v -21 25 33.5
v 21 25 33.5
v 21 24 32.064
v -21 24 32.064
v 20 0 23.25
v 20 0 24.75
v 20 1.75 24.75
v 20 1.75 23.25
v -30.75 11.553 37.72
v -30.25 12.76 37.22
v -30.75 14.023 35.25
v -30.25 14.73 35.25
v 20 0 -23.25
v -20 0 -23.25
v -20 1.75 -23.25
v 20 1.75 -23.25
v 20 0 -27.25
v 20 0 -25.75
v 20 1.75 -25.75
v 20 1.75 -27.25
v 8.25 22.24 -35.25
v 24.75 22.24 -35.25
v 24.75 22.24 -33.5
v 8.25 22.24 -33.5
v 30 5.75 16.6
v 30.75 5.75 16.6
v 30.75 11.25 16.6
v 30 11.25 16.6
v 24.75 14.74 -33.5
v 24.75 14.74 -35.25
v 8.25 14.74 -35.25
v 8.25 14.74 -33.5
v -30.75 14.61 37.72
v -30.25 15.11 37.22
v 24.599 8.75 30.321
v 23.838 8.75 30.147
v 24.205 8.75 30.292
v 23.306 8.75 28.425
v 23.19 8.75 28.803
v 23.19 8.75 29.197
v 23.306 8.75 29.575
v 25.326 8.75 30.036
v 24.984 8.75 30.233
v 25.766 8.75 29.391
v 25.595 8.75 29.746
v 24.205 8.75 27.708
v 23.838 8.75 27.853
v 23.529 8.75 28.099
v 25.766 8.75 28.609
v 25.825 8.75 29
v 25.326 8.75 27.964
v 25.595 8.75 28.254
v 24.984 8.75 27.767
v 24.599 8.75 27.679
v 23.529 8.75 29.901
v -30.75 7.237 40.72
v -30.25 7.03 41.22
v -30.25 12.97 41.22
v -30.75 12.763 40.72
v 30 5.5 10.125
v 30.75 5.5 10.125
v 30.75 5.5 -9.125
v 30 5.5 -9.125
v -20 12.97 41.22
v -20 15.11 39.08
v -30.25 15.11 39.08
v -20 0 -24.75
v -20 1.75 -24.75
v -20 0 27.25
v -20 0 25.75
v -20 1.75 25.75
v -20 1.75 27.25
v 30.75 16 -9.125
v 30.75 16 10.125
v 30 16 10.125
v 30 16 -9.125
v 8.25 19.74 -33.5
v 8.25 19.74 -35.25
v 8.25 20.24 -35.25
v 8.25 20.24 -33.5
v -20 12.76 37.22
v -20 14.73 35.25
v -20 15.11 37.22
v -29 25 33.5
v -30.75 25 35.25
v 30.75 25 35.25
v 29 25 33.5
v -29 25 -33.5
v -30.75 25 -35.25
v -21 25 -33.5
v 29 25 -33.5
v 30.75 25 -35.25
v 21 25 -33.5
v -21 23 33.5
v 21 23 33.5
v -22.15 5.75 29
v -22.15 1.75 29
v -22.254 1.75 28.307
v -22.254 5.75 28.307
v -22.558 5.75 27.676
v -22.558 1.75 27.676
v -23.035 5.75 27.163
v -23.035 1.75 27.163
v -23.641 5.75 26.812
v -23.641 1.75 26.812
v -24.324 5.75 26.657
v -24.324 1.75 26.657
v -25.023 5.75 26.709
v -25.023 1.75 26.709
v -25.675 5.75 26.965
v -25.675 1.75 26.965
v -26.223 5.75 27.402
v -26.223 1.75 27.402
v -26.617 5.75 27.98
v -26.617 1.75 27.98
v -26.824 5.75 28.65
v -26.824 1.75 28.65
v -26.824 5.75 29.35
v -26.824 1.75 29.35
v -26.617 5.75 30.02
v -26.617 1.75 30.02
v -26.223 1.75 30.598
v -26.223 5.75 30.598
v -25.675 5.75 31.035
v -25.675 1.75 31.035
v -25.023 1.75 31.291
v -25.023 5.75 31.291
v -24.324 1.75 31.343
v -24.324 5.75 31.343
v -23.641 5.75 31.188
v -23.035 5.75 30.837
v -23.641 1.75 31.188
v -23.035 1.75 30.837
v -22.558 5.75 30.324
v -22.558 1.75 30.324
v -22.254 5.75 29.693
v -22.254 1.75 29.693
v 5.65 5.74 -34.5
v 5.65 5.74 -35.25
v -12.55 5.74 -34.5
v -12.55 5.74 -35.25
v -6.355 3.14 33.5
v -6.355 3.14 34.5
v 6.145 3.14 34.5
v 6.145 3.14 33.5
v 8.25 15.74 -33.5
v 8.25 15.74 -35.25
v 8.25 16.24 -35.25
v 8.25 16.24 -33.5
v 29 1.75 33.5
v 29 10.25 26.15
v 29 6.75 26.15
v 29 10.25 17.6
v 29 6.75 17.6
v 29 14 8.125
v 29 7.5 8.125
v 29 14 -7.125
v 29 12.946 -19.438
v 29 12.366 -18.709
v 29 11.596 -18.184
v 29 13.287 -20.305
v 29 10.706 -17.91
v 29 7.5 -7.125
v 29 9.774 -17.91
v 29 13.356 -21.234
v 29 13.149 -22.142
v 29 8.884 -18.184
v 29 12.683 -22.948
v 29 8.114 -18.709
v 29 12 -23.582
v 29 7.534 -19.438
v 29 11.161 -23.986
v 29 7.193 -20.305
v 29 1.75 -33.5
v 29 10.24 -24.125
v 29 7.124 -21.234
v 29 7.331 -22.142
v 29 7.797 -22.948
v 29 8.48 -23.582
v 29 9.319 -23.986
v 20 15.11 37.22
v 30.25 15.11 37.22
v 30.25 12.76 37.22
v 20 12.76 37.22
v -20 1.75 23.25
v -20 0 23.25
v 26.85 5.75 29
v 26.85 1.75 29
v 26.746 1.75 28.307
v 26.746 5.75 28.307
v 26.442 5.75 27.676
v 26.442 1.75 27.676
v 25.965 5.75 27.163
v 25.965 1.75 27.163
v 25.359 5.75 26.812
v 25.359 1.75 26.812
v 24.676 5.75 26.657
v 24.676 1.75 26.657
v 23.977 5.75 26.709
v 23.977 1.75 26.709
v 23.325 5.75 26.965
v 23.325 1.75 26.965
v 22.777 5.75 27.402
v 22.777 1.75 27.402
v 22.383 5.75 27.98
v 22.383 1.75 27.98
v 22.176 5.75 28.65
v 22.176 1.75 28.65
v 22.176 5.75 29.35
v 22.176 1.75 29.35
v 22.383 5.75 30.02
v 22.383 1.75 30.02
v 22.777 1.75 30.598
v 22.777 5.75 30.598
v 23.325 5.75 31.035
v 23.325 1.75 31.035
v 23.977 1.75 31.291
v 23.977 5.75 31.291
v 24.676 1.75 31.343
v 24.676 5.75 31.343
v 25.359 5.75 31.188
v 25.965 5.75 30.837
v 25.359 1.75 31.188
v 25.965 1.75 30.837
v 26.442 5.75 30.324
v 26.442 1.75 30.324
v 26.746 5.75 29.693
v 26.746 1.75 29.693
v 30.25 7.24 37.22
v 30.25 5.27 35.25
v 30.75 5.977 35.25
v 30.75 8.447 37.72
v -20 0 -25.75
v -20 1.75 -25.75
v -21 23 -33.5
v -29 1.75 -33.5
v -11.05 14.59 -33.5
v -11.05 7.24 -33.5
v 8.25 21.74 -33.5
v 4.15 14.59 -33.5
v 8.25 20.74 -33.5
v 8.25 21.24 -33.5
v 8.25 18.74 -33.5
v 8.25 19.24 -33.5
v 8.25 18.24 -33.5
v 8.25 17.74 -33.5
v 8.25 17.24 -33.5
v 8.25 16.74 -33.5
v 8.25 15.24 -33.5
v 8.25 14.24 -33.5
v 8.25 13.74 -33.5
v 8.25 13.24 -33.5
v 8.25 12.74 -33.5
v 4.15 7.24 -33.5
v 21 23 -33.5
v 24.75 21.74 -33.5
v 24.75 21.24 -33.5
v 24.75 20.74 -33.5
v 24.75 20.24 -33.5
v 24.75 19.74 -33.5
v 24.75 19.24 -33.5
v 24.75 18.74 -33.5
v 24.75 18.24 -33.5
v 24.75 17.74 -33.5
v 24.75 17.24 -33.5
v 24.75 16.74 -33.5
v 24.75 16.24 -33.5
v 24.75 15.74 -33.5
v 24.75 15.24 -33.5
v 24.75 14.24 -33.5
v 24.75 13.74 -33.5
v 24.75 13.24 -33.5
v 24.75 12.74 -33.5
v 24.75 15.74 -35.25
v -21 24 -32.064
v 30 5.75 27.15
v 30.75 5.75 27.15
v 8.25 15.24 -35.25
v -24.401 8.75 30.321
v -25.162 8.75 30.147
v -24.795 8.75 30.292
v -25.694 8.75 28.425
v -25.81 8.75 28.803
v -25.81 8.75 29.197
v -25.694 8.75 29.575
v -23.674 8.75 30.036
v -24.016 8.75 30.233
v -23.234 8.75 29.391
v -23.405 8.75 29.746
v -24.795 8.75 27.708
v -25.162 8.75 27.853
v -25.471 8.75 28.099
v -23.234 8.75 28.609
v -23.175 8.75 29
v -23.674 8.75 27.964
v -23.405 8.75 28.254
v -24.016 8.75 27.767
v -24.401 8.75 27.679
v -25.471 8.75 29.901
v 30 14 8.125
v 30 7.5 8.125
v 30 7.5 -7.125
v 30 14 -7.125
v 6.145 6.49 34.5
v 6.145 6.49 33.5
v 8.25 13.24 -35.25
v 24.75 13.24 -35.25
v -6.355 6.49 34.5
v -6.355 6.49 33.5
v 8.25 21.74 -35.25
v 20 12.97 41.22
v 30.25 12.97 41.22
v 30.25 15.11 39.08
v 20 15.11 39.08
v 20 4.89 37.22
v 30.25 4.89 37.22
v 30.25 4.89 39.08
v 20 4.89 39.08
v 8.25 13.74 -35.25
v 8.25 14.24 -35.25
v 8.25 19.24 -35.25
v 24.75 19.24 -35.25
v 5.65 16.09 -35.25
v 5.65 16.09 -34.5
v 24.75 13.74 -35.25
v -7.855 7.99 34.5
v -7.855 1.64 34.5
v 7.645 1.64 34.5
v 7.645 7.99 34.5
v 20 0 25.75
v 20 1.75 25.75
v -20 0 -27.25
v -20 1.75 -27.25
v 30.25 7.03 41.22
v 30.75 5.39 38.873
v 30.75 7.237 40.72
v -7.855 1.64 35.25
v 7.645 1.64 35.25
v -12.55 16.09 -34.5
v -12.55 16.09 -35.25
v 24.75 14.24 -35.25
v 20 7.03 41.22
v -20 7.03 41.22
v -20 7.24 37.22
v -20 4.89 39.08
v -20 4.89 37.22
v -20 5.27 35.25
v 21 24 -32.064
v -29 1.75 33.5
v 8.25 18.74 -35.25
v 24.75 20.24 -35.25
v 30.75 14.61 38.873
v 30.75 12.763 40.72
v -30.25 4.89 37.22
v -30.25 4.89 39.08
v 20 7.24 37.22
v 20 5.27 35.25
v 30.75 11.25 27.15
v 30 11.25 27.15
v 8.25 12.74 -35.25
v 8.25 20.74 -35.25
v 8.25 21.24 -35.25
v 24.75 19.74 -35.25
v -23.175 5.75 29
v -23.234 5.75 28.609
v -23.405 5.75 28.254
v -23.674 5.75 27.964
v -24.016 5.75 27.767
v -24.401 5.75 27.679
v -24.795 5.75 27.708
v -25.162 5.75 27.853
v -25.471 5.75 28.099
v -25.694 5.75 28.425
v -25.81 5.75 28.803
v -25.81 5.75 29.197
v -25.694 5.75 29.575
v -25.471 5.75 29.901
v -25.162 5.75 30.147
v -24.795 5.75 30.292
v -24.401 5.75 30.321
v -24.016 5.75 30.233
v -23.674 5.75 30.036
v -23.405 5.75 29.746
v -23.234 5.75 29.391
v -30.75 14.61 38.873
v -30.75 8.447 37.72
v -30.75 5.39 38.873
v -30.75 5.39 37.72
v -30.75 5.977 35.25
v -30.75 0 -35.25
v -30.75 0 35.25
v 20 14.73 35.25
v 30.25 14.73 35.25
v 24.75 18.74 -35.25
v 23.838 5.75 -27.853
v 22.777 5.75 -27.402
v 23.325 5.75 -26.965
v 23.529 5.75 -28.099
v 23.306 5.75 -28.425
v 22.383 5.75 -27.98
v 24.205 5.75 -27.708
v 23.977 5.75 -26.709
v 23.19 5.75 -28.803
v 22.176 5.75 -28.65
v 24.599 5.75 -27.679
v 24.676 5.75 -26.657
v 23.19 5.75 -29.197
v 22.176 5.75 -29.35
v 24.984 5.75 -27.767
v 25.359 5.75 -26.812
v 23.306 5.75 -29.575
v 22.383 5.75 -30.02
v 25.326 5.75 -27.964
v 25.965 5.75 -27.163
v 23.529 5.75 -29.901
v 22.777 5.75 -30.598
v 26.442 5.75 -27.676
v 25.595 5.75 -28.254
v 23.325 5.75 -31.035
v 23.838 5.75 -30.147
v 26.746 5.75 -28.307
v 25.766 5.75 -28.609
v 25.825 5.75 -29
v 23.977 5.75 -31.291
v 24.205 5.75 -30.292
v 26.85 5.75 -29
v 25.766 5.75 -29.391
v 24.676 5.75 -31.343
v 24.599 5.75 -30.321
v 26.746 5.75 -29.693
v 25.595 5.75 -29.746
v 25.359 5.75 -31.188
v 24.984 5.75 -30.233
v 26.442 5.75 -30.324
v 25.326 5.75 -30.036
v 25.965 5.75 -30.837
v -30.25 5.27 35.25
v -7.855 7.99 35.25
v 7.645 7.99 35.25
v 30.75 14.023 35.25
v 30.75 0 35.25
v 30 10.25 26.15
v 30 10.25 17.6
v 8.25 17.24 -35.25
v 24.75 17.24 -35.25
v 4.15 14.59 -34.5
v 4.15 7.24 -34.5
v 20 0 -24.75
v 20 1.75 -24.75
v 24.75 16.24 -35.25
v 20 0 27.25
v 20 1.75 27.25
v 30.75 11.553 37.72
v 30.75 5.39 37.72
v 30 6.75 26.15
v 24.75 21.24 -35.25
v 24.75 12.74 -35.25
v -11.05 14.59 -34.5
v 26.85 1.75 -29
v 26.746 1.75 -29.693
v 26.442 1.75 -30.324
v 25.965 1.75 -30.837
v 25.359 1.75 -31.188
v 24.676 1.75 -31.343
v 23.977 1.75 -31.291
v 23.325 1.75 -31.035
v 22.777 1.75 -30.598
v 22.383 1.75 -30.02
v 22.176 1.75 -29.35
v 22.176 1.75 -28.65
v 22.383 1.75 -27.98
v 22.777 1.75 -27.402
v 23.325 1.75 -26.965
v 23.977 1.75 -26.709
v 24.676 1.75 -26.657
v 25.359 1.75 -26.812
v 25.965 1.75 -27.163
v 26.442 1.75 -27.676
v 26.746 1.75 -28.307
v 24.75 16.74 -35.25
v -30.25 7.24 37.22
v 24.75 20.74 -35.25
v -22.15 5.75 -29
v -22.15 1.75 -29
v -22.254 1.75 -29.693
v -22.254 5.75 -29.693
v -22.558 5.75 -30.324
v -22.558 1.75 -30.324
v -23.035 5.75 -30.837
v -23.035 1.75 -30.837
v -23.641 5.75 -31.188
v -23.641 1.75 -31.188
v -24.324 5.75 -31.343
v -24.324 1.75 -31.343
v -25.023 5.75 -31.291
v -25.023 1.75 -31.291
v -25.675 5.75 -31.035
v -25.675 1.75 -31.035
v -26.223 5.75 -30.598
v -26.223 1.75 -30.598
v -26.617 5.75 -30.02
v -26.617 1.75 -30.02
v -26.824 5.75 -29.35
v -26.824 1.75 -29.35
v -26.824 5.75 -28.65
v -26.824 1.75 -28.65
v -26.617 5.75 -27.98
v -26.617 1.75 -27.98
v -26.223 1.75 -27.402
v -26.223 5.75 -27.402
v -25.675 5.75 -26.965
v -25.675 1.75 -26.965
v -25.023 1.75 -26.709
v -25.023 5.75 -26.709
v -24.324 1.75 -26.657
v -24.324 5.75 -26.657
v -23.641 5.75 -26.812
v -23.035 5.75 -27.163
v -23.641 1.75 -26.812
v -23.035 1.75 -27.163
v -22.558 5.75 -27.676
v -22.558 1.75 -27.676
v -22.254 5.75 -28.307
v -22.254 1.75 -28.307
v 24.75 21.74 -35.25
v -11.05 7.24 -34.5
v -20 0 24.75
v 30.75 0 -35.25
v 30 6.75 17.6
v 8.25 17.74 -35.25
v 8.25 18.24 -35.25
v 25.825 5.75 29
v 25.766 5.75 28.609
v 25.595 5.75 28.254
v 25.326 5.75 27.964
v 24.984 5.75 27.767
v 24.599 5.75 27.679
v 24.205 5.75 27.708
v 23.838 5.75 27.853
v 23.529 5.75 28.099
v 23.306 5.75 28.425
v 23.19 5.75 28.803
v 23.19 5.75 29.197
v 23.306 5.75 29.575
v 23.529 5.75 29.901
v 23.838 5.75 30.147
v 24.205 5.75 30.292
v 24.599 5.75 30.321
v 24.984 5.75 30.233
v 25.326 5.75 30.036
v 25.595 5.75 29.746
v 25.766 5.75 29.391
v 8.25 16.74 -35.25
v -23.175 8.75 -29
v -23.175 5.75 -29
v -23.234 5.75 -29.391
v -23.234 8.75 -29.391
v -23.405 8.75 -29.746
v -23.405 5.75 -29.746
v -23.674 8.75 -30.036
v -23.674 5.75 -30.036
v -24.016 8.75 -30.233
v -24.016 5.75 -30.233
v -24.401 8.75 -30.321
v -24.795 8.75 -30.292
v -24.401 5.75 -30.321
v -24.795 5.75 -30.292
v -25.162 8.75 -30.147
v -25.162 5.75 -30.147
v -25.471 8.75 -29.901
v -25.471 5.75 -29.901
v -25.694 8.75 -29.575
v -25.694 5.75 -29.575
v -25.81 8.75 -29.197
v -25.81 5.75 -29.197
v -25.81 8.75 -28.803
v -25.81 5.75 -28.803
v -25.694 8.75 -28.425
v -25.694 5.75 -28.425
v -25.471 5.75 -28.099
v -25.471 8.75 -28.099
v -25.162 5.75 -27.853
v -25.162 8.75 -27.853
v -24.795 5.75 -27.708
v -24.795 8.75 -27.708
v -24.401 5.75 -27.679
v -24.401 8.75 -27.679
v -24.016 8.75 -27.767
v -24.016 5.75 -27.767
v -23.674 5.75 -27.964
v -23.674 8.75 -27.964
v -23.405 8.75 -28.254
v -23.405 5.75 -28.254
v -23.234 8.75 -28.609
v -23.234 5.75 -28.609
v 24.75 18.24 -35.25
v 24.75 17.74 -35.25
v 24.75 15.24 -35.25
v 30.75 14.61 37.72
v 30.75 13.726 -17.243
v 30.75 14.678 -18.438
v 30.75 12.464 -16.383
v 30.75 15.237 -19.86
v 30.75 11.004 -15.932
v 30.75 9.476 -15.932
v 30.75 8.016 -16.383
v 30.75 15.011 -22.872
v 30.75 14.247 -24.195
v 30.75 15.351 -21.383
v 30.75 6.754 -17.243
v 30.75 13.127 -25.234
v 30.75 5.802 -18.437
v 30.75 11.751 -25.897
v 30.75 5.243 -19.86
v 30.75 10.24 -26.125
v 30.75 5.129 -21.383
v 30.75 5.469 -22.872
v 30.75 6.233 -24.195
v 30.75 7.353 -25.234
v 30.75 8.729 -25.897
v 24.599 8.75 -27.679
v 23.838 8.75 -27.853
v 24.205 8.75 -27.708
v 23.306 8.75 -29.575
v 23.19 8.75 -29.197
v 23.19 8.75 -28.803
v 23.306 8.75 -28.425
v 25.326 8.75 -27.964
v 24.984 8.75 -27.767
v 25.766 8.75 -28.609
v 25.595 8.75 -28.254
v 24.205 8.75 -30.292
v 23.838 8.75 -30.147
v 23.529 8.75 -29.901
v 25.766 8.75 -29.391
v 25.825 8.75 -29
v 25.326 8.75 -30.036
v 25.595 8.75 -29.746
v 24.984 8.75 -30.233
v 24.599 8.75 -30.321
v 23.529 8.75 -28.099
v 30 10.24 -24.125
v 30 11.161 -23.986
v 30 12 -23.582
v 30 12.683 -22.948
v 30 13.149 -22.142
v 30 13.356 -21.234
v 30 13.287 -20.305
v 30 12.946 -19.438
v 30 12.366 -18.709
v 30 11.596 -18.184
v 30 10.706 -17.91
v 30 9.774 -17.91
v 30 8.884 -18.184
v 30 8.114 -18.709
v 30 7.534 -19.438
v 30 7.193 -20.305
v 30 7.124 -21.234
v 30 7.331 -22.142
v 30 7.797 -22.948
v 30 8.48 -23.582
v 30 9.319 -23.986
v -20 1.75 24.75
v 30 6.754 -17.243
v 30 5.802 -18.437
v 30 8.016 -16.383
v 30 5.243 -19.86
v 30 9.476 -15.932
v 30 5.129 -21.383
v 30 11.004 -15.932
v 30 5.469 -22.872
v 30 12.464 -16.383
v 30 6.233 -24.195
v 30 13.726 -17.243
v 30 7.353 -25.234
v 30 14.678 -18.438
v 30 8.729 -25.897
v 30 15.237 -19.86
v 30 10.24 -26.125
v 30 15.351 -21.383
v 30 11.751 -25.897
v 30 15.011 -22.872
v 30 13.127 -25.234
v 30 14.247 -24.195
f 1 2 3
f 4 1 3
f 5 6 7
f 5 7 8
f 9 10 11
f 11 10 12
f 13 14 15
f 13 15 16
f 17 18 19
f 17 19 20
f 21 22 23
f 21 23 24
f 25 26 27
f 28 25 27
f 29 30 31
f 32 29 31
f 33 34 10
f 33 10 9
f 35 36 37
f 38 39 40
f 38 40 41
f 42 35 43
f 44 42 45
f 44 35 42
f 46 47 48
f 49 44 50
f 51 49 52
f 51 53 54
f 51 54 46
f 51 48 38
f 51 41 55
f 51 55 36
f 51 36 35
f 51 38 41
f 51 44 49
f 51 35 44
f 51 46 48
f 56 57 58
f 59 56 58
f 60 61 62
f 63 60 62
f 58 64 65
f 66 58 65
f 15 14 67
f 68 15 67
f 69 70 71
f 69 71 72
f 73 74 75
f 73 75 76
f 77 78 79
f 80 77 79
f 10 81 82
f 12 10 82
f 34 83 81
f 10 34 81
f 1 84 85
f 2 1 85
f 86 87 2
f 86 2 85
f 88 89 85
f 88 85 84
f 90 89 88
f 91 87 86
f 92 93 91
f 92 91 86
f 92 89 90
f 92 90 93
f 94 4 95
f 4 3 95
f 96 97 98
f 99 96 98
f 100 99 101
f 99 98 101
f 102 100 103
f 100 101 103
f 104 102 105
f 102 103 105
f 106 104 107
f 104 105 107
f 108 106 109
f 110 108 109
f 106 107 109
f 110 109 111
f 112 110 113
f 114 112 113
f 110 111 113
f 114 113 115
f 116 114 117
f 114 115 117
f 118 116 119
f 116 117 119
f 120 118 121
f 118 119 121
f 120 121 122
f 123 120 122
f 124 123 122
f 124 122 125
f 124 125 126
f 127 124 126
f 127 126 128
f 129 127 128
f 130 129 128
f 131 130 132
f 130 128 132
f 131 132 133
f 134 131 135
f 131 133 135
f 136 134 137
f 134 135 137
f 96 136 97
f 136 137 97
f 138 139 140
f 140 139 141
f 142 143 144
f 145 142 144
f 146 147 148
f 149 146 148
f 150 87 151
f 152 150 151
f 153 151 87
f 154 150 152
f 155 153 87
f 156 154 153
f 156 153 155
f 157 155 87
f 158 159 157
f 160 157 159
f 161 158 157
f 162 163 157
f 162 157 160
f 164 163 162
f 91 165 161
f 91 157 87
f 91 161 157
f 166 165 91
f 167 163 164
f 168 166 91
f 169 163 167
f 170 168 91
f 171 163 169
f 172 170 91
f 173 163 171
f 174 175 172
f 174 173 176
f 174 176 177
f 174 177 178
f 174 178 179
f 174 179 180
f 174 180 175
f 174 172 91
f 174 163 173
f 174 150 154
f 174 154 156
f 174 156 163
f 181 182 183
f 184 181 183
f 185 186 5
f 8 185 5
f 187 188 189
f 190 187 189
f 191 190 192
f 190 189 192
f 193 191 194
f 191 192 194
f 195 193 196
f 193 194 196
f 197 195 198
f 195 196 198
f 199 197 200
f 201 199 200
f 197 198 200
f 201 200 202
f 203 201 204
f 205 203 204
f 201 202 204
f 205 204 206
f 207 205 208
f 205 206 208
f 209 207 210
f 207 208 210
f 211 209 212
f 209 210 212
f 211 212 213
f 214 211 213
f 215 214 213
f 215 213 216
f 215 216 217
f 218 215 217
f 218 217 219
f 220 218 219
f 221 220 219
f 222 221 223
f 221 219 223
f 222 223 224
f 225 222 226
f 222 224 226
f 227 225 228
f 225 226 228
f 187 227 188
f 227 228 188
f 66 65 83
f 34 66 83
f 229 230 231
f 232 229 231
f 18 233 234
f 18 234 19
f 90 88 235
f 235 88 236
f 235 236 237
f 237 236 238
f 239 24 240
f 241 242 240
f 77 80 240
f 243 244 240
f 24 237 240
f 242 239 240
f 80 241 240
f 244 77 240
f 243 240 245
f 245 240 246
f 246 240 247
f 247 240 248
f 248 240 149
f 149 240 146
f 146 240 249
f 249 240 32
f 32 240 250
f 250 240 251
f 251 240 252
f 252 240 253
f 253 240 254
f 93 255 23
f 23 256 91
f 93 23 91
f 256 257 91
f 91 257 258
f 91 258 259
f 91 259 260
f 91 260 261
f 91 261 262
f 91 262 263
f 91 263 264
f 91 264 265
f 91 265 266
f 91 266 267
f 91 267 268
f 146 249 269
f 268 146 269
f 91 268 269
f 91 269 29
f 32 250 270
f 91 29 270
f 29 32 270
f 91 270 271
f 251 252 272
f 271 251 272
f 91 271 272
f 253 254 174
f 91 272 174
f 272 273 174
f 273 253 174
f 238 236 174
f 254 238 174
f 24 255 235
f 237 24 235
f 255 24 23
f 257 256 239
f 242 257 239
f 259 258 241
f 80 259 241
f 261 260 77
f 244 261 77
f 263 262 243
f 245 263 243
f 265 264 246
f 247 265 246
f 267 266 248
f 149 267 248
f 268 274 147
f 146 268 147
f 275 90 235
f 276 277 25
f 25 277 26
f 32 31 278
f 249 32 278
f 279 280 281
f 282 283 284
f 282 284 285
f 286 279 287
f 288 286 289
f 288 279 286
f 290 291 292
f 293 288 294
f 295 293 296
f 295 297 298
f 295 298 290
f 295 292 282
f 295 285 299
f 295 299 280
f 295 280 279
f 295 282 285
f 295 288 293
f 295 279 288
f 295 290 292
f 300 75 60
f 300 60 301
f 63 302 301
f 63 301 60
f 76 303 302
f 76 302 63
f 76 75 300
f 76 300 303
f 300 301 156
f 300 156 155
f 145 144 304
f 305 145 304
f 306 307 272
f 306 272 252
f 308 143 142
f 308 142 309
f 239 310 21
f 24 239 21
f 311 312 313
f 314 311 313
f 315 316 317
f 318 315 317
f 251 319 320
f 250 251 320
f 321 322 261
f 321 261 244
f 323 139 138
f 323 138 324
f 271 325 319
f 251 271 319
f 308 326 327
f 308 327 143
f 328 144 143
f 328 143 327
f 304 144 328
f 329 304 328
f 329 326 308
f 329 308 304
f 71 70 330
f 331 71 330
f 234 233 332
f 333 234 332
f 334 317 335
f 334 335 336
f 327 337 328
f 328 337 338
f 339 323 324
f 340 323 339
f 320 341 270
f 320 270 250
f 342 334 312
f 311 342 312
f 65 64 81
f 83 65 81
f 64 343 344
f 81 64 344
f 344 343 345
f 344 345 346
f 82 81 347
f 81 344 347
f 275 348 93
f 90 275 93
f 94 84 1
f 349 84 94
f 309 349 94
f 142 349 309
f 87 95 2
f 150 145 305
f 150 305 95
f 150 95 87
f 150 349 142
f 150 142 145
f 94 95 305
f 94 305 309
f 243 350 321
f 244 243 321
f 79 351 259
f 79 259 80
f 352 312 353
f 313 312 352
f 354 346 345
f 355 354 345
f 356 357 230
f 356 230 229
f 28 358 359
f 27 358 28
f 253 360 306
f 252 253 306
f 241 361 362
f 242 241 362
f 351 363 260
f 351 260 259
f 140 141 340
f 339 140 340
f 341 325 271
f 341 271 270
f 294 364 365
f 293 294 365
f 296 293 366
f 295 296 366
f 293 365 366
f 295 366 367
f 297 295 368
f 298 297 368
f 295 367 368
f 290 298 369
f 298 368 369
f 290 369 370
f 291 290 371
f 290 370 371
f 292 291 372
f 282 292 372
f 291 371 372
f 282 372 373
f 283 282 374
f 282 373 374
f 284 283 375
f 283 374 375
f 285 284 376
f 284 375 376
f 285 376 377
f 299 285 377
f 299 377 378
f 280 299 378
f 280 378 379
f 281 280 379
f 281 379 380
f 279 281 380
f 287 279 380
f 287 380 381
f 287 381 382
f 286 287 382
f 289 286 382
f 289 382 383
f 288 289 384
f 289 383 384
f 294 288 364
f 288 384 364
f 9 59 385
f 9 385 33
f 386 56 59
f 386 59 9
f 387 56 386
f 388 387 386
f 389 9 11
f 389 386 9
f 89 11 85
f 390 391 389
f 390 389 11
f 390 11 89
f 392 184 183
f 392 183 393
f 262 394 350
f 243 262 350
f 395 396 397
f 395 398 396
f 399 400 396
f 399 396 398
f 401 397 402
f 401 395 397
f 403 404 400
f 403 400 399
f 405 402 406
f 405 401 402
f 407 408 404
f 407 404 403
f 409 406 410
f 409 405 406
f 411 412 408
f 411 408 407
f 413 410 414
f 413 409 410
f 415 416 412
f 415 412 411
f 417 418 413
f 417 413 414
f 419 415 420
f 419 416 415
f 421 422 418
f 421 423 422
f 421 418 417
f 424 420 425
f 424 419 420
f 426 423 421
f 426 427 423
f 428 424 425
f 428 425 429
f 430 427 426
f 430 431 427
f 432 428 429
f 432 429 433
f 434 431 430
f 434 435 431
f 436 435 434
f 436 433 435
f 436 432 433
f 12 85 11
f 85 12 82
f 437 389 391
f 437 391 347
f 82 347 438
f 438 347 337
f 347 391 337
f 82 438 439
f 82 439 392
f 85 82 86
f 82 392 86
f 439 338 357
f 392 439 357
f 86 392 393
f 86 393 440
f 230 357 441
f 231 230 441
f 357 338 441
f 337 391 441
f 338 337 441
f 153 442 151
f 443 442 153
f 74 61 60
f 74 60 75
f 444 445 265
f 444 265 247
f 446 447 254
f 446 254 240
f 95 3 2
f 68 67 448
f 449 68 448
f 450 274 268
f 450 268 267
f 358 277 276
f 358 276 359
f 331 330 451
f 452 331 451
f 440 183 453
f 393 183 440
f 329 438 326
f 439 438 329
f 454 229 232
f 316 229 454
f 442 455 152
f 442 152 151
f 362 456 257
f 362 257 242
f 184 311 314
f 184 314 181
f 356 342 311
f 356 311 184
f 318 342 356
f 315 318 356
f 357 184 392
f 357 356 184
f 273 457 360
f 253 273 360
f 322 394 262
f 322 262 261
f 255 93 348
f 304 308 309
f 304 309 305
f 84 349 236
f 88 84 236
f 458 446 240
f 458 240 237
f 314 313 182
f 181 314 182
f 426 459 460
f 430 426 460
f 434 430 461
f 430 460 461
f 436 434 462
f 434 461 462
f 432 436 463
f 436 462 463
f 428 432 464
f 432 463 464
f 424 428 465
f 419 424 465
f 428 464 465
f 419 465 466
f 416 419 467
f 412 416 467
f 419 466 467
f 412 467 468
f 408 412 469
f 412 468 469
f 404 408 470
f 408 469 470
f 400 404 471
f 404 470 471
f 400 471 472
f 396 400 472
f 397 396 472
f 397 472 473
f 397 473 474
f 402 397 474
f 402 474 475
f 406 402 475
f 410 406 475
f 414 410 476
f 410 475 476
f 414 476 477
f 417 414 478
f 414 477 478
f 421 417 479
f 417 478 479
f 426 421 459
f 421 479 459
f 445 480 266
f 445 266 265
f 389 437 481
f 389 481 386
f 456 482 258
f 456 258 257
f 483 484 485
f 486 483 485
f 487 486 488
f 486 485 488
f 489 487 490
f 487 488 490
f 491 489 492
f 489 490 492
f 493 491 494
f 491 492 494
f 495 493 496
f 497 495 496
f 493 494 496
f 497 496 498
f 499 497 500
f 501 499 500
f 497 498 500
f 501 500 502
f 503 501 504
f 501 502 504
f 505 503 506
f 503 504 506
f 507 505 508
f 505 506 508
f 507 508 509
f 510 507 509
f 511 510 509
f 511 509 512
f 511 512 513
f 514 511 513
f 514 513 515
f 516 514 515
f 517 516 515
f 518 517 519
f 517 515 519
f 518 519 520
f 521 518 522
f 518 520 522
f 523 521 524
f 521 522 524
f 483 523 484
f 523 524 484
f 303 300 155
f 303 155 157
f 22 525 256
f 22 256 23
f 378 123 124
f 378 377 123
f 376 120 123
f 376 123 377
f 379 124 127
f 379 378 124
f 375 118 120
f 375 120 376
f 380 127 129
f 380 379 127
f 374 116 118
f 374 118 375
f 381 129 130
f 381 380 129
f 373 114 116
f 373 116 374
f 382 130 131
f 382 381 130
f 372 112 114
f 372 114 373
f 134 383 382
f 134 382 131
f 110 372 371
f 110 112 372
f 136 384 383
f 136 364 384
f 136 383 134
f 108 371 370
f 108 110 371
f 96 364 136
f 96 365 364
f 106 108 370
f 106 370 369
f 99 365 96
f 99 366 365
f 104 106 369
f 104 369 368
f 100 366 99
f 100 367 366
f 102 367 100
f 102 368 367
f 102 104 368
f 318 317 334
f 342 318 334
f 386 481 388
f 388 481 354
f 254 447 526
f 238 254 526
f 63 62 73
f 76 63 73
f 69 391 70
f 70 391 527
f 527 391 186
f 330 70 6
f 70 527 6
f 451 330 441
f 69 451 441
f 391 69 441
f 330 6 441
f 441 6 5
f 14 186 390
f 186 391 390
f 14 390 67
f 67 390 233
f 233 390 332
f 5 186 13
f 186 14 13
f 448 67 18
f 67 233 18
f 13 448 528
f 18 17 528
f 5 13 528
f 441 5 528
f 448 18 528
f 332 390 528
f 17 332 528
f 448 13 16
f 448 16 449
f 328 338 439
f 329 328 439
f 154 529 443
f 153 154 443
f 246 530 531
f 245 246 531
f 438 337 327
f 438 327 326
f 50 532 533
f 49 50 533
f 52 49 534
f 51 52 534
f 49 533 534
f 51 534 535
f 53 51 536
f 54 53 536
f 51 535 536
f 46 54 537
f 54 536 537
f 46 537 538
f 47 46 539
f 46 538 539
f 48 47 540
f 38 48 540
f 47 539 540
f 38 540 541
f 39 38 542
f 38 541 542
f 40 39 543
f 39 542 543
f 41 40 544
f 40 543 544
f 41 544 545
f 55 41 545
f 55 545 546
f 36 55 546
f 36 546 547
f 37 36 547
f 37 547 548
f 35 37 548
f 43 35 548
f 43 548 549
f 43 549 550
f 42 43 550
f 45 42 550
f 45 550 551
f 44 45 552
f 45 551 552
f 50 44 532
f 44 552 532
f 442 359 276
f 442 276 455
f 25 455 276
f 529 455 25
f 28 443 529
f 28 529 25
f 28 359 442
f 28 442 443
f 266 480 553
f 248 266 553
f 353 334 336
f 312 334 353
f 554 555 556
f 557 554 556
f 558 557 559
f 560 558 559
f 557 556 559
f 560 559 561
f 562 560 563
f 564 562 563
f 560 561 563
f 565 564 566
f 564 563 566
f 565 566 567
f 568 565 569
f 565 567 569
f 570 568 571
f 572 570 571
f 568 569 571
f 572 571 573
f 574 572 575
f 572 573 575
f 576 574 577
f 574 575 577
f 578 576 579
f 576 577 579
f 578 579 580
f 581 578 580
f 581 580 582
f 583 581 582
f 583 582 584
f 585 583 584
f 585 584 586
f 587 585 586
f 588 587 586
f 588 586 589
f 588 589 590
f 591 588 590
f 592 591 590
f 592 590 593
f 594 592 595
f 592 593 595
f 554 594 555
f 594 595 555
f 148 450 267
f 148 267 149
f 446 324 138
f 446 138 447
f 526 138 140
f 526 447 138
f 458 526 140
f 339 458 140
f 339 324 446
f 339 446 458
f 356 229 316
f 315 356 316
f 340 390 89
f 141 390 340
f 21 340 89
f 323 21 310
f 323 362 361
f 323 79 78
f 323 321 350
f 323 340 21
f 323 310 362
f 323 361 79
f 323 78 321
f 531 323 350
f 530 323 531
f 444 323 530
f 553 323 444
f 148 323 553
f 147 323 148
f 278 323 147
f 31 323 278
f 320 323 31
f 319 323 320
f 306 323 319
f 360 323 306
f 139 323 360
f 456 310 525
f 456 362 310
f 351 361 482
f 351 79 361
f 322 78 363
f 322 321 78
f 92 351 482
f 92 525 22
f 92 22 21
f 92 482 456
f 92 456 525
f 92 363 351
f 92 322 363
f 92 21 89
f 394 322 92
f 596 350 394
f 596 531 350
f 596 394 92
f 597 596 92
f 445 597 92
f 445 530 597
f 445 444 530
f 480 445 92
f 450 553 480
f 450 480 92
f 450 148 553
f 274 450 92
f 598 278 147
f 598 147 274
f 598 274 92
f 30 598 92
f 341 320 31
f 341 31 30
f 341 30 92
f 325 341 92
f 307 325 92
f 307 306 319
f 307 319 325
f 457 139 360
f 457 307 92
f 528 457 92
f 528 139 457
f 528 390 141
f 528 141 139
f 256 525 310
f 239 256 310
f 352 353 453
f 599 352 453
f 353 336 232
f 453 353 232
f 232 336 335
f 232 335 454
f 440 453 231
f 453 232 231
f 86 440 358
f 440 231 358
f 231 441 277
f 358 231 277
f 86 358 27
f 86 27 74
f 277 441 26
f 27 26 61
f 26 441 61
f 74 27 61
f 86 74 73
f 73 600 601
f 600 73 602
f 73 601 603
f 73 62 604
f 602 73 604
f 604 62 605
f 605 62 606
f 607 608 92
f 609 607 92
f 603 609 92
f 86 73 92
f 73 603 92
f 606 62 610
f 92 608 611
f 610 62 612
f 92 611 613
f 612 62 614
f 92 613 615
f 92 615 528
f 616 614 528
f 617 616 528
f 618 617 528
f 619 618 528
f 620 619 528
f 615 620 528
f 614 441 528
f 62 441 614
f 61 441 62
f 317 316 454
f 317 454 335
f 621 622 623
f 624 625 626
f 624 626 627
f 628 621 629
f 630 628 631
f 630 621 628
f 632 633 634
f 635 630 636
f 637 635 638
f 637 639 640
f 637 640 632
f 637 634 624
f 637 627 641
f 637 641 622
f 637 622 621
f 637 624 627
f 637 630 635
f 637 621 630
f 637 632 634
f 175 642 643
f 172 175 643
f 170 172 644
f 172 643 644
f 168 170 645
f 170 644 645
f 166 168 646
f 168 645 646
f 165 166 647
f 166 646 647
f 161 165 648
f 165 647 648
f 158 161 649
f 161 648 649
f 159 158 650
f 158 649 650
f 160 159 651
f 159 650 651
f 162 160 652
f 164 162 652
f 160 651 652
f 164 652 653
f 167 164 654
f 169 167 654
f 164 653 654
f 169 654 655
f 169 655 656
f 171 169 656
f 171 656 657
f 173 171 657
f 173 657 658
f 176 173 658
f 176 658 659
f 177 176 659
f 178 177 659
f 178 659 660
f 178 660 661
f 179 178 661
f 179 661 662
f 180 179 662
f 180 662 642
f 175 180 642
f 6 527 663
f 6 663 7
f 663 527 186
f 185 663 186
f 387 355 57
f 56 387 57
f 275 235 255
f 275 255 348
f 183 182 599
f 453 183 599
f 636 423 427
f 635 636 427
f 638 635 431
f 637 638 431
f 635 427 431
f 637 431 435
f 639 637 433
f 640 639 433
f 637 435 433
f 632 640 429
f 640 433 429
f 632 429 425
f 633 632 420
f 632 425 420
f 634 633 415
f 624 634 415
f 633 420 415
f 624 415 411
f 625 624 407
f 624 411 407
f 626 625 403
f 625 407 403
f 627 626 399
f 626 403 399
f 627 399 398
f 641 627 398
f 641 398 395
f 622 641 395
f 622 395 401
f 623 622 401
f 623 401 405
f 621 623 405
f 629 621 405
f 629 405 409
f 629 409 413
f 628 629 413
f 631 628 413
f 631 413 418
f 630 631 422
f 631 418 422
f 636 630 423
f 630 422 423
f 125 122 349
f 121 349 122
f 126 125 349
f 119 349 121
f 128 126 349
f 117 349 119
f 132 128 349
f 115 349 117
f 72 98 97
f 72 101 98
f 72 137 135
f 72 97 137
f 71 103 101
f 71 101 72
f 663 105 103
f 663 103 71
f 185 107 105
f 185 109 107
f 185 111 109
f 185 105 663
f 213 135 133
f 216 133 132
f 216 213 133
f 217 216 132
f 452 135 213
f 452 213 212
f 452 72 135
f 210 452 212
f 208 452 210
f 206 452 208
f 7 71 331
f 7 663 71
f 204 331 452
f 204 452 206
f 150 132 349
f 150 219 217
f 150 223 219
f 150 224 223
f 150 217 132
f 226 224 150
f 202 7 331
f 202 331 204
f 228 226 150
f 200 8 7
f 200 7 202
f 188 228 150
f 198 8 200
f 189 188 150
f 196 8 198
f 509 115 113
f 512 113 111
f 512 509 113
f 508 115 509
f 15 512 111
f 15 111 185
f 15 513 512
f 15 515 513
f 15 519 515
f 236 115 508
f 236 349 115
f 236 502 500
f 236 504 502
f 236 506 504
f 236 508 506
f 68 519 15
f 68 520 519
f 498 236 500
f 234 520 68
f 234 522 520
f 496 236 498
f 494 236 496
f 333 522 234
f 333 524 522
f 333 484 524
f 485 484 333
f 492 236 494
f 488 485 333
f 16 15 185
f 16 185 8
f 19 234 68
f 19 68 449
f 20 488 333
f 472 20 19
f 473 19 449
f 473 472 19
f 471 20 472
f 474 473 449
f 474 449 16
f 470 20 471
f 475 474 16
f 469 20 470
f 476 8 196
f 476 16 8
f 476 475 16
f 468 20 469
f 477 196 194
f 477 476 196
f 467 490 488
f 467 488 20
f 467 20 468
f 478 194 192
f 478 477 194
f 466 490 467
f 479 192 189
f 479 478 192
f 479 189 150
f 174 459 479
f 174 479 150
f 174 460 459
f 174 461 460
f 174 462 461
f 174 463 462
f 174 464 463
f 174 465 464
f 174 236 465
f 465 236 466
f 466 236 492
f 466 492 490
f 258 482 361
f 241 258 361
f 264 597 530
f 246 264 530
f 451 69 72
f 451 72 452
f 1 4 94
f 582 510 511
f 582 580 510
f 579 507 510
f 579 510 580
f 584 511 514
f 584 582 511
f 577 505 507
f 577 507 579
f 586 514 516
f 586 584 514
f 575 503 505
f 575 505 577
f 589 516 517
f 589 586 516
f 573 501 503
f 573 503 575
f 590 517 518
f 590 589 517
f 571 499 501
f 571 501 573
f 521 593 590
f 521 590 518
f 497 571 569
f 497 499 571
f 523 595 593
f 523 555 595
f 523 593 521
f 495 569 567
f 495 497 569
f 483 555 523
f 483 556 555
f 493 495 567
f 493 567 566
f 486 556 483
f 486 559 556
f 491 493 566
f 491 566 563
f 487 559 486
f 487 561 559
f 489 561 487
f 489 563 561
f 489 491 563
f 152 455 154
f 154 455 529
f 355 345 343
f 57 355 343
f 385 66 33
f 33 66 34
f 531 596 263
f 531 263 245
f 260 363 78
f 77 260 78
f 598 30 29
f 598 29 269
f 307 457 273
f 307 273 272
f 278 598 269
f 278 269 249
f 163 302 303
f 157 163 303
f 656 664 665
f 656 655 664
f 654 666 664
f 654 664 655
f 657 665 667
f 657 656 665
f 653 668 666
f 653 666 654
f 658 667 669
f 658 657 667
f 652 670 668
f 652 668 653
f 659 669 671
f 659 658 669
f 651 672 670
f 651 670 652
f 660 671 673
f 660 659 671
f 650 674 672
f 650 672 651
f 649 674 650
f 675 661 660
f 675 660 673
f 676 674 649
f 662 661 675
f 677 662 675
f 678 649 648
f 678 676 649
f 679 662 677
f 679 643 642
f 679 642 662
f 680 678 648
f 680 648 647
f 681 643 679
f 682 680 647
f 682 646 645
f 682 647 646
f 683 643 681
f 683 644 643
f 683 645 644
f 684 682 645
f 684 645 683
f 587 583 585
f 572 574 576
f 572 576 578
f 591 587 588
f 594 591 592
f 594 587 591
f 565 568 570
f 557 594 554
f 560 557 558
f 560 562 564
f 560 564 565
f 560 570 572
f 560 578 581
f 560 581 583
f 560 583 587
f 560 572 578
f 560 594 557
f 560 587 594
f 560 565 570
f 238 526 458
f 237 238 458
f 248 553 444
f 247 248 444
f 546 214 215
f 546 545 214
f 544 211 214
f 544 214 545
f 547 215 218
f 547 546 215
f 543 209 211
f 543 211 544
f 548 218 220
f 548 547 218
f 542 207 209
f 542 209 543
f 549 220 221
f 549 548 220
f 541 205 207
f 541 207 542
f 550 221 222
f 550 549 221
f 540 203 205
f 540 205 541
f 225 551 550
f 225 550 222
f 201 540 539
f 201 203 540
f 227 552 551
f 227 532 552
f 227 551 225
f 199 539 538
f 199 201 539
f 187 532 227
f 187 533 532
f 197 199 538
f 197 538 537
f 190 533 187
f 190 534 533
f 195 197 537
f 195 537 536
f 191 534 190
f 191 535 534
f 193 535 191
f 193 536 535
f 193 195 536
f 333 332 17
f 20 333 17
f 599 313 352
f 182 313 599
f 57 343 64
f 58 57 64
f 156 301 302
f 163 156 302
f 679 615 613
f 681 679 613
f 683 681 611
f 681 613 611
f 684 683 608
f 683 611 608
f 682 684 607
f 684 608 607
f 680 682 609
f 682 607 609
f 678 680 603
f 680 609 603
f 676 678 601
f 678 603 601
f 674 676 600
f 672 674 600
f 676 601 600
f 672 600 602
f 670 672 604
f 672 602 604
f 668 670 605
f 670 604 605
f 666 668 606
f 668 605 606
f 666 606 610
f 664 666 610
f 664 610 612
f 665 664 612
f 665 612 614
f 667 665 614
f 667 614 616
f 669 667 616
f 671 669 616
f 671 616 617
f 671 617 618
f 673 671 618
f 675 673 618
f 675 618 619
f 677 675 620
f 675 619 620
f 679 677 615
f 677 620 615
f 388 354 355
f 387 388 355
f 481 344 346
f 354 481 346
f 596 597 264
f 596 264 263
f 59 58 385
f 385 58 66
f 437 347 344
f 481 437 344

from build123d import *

# Parameters (mm, degrees)
SKETCH1_W                       = 61.5
SKETCH1_H                       = 70.5
SKETCH1_W_2                     = 58
SKETCH1_H_2                     = 67
BOSS_EXTRUDE1_DEPTH             = 25
SKETCH2_W                       = 61.5
SKETCH2_H                       = 70.5
BOSS_EXTRUDE5_DEPTH             = 1.75
SKETCH3_R                       = 2.35
BOSS_EXTRUDE2_DEPTH             = 4
SKETCH4_R                       = 1.325
BOSS_EXTRUDE3_DEPTH             = 3
CUT_EXTRUDE2_REACH              = 63.5
SKETCH5_R                       = 3.125
SKETCH5_W                       = 8.55
SKETCH5_H                       = 3.5
SKETCH5_W_2                     = 15.25
SKETCH5_H_2                     = 6.5
BOSS_EXTRUDE4_REACH             = 32.75
BOSS_EXTRUDE4_DIRECTION_2_REACH = 32.75
CUT_EXTRUDE3_START              = 4.89
SKETCH8_W                       = 40
SKETCH8_H                       = 5.97
CUT_EXTRUDE3_DEPTH              = 10.22
CUT_EXTRUDE4_REACH              = 78.47
SKETCH10_W                      = 15.2
SKETCH10_H                      = 7.35
SKETCH10_W_2                    = 16.5
SKETCH10_H_2                    = 0.5
CUT_EXTRUDE6_REACH              = 72.5
SKETCH13_W                      = 12.5
SKETCH13_H                      = 3.35
SKETCH14_R                      = 5.125
SKETCH14_W                      = 10.55
SKETCH14_H                      = 5.5
SKETCH14_W_2                    = 19.25
SKETCH14_H_2                    = 10.5
CUT_EXTRUDE7_DEPTH              = 0.75
SKETCH15_W                      = 18.2
SKETCH15_H                      = 10.35
CUT_EXTRUDE8_DEPTH              = 0.75
SKETCH17_W                      = 15.5
SKETCH17_H                      = 6.35
CUT_EXTRUDE9_DEPTH              = 0.75
BOSS_EXTRUDE6_DEPTH             = 21
BOSS_EXTRUDE6_DEPTH_BACK        = 21
SKETCH19_W                      = 40
SKETCH19_H                      = 1.5
CUT_EXTRUDE11_DEPTH             = 1.75
LPATTERN1_COUNT                 = 2
LPATTERN1_PITCH                 = 2.5
MIRROR1_COPY_1_SKETCH_W         = 40
MIRROR1_COPY_1_SKETCH_H         = 1.5
MIRROR1_COPY_1_DEPTH            = 1.75
CHAMFER1_SIZE                   = 0.5


with BuildPart() as part:
    # Sketch1 → Boss-Extrude1 (new body)
    with BuildSketch(Plane(origin=(0, 0, 0), x_dir=(1, 0, 0), z_dir=(0, 1, 0))):
        Rectangle(SKETCH1_W, SKETCH1_H)
        Rectangle(SKETCH1_W_2, SKETCH1_H_2, mode=Mode.SUBTRACT)
    extrude(amount=BOSS_EXTRUDE1_DEPTH)

    # Sketch2 → Boss-Extrude5 (add)
    with BuildSketch(Plane(origin=(0, 0, 0), x_dir=(1, 0, 0), z_dir=(0, 1, 0))):
        Rectangle(SKETCH2_W, SKETCH2_H)
    extrude(amount=BOSS_EXTRUDE5_DEPTH)

    # Sketch3 → Boss-Extrude2 (add)
    with BuildSketch(Plane(origin=(0, 1.75, 0), x_dir=(1, 0, 0), z_dir=(0, 1, 0))):
        with Locations((-24.5, 29)):
            Circle(SKETCH3_R)
        with Locations((24.5, 29)):
            Circle(SKETCH3_R)
        with Locations((24.5, -29)):
            Circle(SKETCH3_R)
        with Locations((-24.5, -29)):
            Circle(SKETCH3_R)
    extrude(amount=BOSS_EXTRUDE2_DEPTH)

    # Sketch4 → Boss-Extrude3 (add)
    with BuildSketch(Plane(origin=(0, 5.75, 0), x_dir=(1, 0, 0), z_dir=(0, 1, 0))):
        with Locations((-24.5, 29)):
            Circle(SKETCH4_R)
        with Locations((24.5, 29)):
            Circle(SKETCH4_R)
        with Locations((24.5, -29)):
            Circle(SKETCH4_R)
        with Locations((-24.5, -29)):
            Circle(SKETCH4_R)
    extrude(amount=BOSS_EXTRUDE3_DEPTH)

    # Sketch5 → Cut-Extrude2 (cut, up to next)
    with BuildSketch(Plane(origin=(30.75, 0, 0), x_dir=(0, 0, -1), z_dir=(1, 0, 0)), mode=Mode.PRIVATE) as cut_extrude2_sk1:
        with Locations((21, 10.24)):
            Circle(SKETCH5_R)
    cut_extrude2_tool1 = extrude(cut_extrude2_sk1.sketch, amount=-CUT_EXTRUDE2_REACH, mode=Mode.PRIVATE) & part.part
    add(cut_extrude2_tool1.solids().sort_by_distance((30.75, 10.24, -21))[0], mode=Mode.SUBTRACT)
    # Sketch5 → Cut-Extrude2 (cut, up to next)
    with BuildSketch(Plane(origin=(30.75, 0, 0), x_dir=(0, 0, -1), z_dir=(1, 0, 0)), mode=Mode.PRIVATE) as cut_extrude2_sk2:
        with Locations((-21.875, 8.5)):
            Rectangle(SKETCH5_W, SKETCH5_H)
    cut_extrude2_tool2 = extrude(cut_extrude2_sk2.sketch, amount=-CUT_EXTRUDE2_REACH, mode=Mode.PRIVATE) & part.part
    add(cut_extrude2_tool2.solids().sort_by_distance((30.75, 8.5, 21.875))[0], mode=Mode.SUBTRACT)
    # Sketch5 → Cut-Extrude2 (cut, up to next)
    with BuildSketch(Plane(origin=(30.75, 0, 0), x_dir=(0, 0, -1), z_dir=(1, 0, 0)), mode=Mode.PRIVATE) as cut_extrude2_sk3:
        with Locations((-0.5, 10.75)):
            Rectangle(SKETCH5_W_2, SKETCH5_H_2)
    cut_extrude2_tool3 = extrude(cut_extrude2_sk3.sketch, amount=-CUT_EXTRUDE2_REACH, mode=Mode.PRIVATE) & part.part
    add(cut_extrude2_tool3.solids().sort_by_distance((30.75, 10.75, 0.5))[0], mode=Mode.SUBTRACT)

    # Boss-Extrude4: up to this face of the body (flat: up to its plane)
    boss_extrude4_end = Plane(part.part.faces().sort_by_distance((30.75, 0.748014037, 0))[0])
    # Sketch7 → Boss-Extrude4 (add, up to the picked face)
    with BuildSketch(Plane(origin=(0, 0, 0), x_dir=(0, 0, -1), z_dir=(1, 0, 0)), mode=Mode.PRIVATE) as boss_extrude4_sk1:
        Polygon((-35.25, 14.73), (-35.25, 5.27), (-37.22, 7.24), (-37.22, 4.89), (-39.08, 4.89), (-41.22, 7.03), (-41.22, 12.97), (-39.08, 15.11), (-37.22, 15.11), (-37.22, 12.76), align=None)
    boss_extrude4_tool1 = split(extrude(boss_extrude4_sk1.sketch, amount=BOSS_EXTRUDE4_REACH, mode=Mode.PRIVATE), bisect_by=boss_extrude4_end, keep=Keep.BOTH, mode=Mode.PRIVATE)
    add(boss_extrude4_tool1.solids().sort_by_distance((0, 10, 38.216954))[0])

    # Boss-Extrude4 direction 2: up to this face of the body (flat: up to its plane)
    boss_extrude4_direction_2_end = Plane(part.part.faces().sort_by_distance((-30.75, 12.5, 0))[0])
    # Sketch7 → Boss-Extrude4 direction 2 (add, up to the picked face)
    with BuildSketch(Plane(origin=(0, 0, 0), x_dir=(0, 0, -1), z_dir=(1, 0, 0)), mode=Mode.PRIVATE) as boss_extrude4_direction_2_sk1:
        Polygon((-35.25, 14.73), (-35.25, 5.27), (-37.22, 7.24), (-37.22, 4.89), (-39.08, 4.89), (-41.22, 7.03), (-41.22, 12.97), (-39.08, 15.11), (-37.22, 15.11), (-37.22, 12.76), align=None)
    boss_extrude4_direction_2_tool1 = split(extrude(boss_extrude4_direction_2_sk1.sketch, amount=-BOSS_EXTRUDE4_DIRECTION_2_REACH, mode=Mode.PRIVATE), bisect_by=boss_extrude4_direction_2_end, keep=Keep.BOTH, mode=Mode.PRIVATE)
    add(boss_extrude4_direction_2_tool1.solids().sort_by_distance((0, 10, 38.216954))[0])

    # Sketch8 → Cut-Extrude3 (cut)
    with BuildSketch(Plane(origin=(0, 0, 0), x_dir=(1, 0, 0), z_dir=(0, 1, 0)).offset(CUT_EXTRUDE3_START)):
        with Locations((0, -38.235)):
            Rectangle(SKETCH8_W, SKETCH8_H)
    extrude(amount=CUT_EXTRUDE3_DEPTH, mode=Mode.SUBTRACT)

    # Sketch10 → Cut-Extrude4 (cut, up to next)
    with BuildSketch(Plane(origin=(0, 0, -35.25), x_dir=(-1, 0, 0), z_dir=(0, 0, -1)), mode=Mode.PRIVATE) as cut_extrude4_sk1:
        with Locations((3.45, 10.915)):
            Rectangle(SKETCH10_W, SKETCH10_H)
    cut_extrude4_tool1 = extrude(cut_extrude4_sk1.sketch, amount=-CUT_EXTRUDE4_REACH, mode=Mode.PRIVATE) & part.part
    add(cut_extrude4_tool1.solids().sort_by_distance((-3.45, 10.915, -35.25))[0], mode=Mode.SUBTRACT)
    # Sketch10 → Cut-Extrude4 (cut, up to next)
    with BuildSketch(Plane(origin=(0, 0, -35.25), x_dir=(-1, 0, 0), z_dir=(0, 0, -1)), mode=Mode.PRIVATE) as cut_extrude4_sk2:
        with Locations((-16.5, 21.99)):
            Rectangle(SKETCH10_W_2, SKETCH10_H_2)
    cut_extrude4_tool2 = extrude(cut_extrude4_sk2.sketch, amount=-CUT_EXTRUDE4_REACH, mode=Mode.PRIVATE) & part.part
    add(cut_extrude4_tool2.solids().sort_by_distance((16.5, 21.99, -35.25))[0], mode=Mode.SUBTRACT)
    # Sketch10 → Cut-Extrude4 (cut, up to next)
    with BuildSketch(Plane(origin=(0, 0, -35.25), x_dir=(-1, 0, 0), z_dir=(0, 0, -1)), mode=Mode.PRIVATE) as cut_extrude4_sk3:
        with Locations((-16.5, 20.99)):
            Rectangle(SKETCH10_W_2, SKETCH10_H_2)
    cut_extrude4_tool3 = extrude(cut_extrude4_sk3.sketch, amount=-CUT_EXTRUDE4_REACH, mode=Mode.PRIVATE) & part.part
    add(cut_extrude4_tool3.solids().sort_by_distance((16.5, 20.99, -35.25))[0], mode=Mode.SUBTRACT)
    # Sketch10 → Cut-Extrude4 (cut, up to next)
    with BuildSketch(Plane(origin=(0, 0, -35.25), x_dir=(-1, 0, 0), z_dir=(0, 0, -1)), mode=Mode.PRIVATE) as cut_extrude4_sk4:
        with Locations((-16.5, 19.99)):
            Rectangle(SKETCH10_W_2, SKETCH10_H_2)
    cut_extrude4_tool4 = extrude(cut_extrude4_sk4.sketch, amount=-CUT_EXTRUDE4_REACH, mode=Mode.PRIVATE) & part.part
    add(cut_extrude4_tool4.solids().sort_by_distance((16.5, 19.99, -35.25))[0], mode=Mode.SUBTRACT)
    # Sketch10 → Cut-Extrude4 (cut, up to next)
    with BuildSketch(Plane(origin=(0, 0, -35.25), x_dir=(-1, 0, 0), z_dir=(0, 0, -1)), mode=Mode.PRIVATE) as cut_extrude4_sk5:
        with Locations((-16.5, 18.99)):
            Rectangle(SKETCH10_W_2, SKETCH10_H_2)
    cut_extrude4_tool5 = extrude(cut_extrude4_sk5.sketch, amount=-CUT_EXTRUDE4_REACH, mode=Mode.PRIVATE) & part.part
    add(cut_extrude4_tool5.solids().sort_by_distance((16.5, 18.99, -35.25))[0], mode=Mode.SUBTRACT)
    # Sketch10 → Cut-Extrude4 (cut, up to next)
    with BuildSketch(Plane(origin=(0, 0, -35.25), x_dir=(-1, 0, 0), z_dir=(0, 0, -1)), mode=Mode.PRIVATE) as cut_extrude4_sk6:
        with Locations((-16.5, 17.99)):
            Rectangle(SKETCH10_W_2, SKETCH10_H_2)
    cut_extrude4_tool6 = extrude(cut_extrude4_sk6.sketch, amount=-CUT_EXTRUDE4_REACH, mode=Mode.PRIVATE) & part.part
    add(cut_extrude4_tool6.solids().sort_by_distance((16.5, 17.99, -35.25))[0], mode=Mode.SUBTRACT)
    # Sketch10 → Cut-Extrude4 (cut, up to next)
    with BuildSketch(Plane(origin=(0, 0, -35.25), x_dir=(-1, 0, 0), z_dir=(0, 0, -1)), mode=Mode.PRIVATE) as cut_extrude4_sk7:
        with Locations((-16.5, 16.99)):
            Rectangle(SKETCH10_W_2, SKETCH10_H_2)
    cut_extrude4_tool7 = extrude(cut_extrude4_sk7.sketch, amount=-CUT_EXTRUDE4_REACH, mode=Mode.PRIVATE) & part.part
    add(cut_extrude4_tool7.solids().sort_by_distance((16.5, 16.99, -35.25))[0], mode=Mode.SUBTRACT)
    # Sketch10 → Cut-Extrude4 (cut, up to next)
    with BuildSketch(Plane(origin=(0, 0, -35.25), x_dir=(-1, 0, 0), z_dir=(0, 0, -1)), mode=Mode.PRIVATE) as cut_extrude4_sk8:
        with Locations((-16.5, 15.99)):
            Rectangle(SKETCH10_W_2, SKETCH10_H_2)
    cut_extrude4_tool8 = extrude(cut_extrude4_sk8.sketch, amount=-CUT_EXTRUDE4_REACH, mode=Mode.PRIVATE) & part.part
    add(cut_extrude4_tool8.solids().sort_by_distance((16.5, 15.99, -35.25))[0], mode=Mode.SUBTRACT)
    # Sketch10 → Cut-Extrude4 (cut, up to next)
    with BuildSketch(Plane(origin=(0, 0, -35.25), x_dir=(-1, 0, 0), z_dir=(0, 0, -1)), mode=Mode.PRIVATE) as cut_extrude4_sk9:
        with Locations((-16.5, 14.99)):
            Rectangle(SKETCH10_W_2, SKETCH10_H_2)
    cut_extrude4_tool9 = extrude(cut_extrude4_sk9.sketch, amount=-CUT_EXTRUDE4_REACH, mode=Mode.PRIVATE) & part.part
    add(cut_extrude4_tool9.solids().sort_by_distance((16.5, 14.99, -35.25))[0], mode=Mode.SUBTRACT)
    # Sketch10 → Cut-Extrude4 (cut, up to next)
    with BuildSketch(Plane(origin=(0, 0, -35.25), x_dir=(-1, 0, 0), z_dir=(0, 0, -1)), mode=Mode.PRIVATE) as cut_extrude4_sk10:
        with Locations((-16.5, 13.99)):
            Rectangle(SKETCH10_W_2, SKETCH10_H_2)
    cut_extrude4_tool10 = extrude(cut_extrude4_sk10.sketch, amount=-CUT_EXTRUDE4_REACH, mode=Mode.PRIVATE) & part.part
    add(cut_extrude4_tool10.solids().sort_by_distance((16.5, 13.99, -35.25))[0], mode=Mode.SUBTRACT)
    # Sketch10 → Cut-Extrude4 (cut, up to next)
    with BuildSketch(Plane(origin=(0, 0, -35.25), x_dir=(-1, 0, 0), z_dir=(0, 0, -1)), mode=Mode.PRIVATE) as cut_extrude4_sk11:
        with Locations((-16.5, 12.99)):
            Rectangle(SKETCH10_W_2, SKETCH10_H_2)
    cut_extrude4_tool11 = extrude(cut_extrude4_sk11.sketch, amount=-CUT_EXTRUDE4_REACH, mode=Mode.PRIVATE) & part.part
    add(cut_extrude4_tool11.solids().sort_by_distance((16.5, 12.99, -35.25))[0], mode=Mode.SUBTRACT)

    # Sketch13 → Cut-Extrude6 (cut, up to next)
    with BuildSketch(Plane.XY.offset(35.25), mode=Mode.PRIVATE) as cut_extrude6_sk1:
        with Locations((-0.105, 4.815)):
            Rectangle(SKETCH13_W, SKETCH13_H)
    cut_extrude6_tool1 = extrude(cut_extrude6_sk1.sketch, amount=-CUT_EXTRUDE6_REACH, mode=Mode.PRIVATE) & part.part
    add(cut_extrude6_tool1.solids().sort_by_distance((-0.105, 4.815, 35.25))[0], mode=Mode.SUBTRACT)

    # Sketch14 → Cut-Extrude7 (cut)
    with BuildSketch(Plane(origin=(30.75, 0, 0), x_dir=(0, 0, -1), z_dir=(1, 0, 0))):
        with Locations((21, 10.24)):
            Circle(SKETCH14_R)
        with Locations((-21.875, 8.5)):
            Rectangle(SKETCH14_W, SKETCH14_H)
        with Locations((-0.5, 10.75)):
            Rectangle(SKETCH14_W_2, SKETCH14_H_2)
    extrude(amount=-CUT_EXTRUDE7_DEPTH, mode=Mode.SUBTRACT)

    # Sketch15 → Cut-Extrude8 (cut)
    with BuildSketch(Plane(origin=(0, 0, -35.25), x_dir=(-1, 0, 0), z_dir=(0, 0, -1))):
        with Locations((3.45, 10.915)):
            Rectangle(SKETCH15_W, SKETCH15_H)
    extrude(amount=-CUT_EXTRUDE8_DEPTH, mode=Mode.SUBTRACT)

    # Sketch17 → Cut-Extrude9 (cut)
    with BuildSketch(Plane.XY.offset(35.25)):
        with Locations((-0.105, 4.815)):
            Rectangle(SKETCH17_W, SKETCH17_H)
    extrude(amount=-CUT_EXTRUDE9_DEPTH, mode=Mode.SUBTRACT)

    # Sketch18 → Boss-Extrude6 (add, two sides)
    with BuildSketch(Plane(origin=(0, 0, 0), x_dir=(0, 0, -1), z_dir=(1, 0, 0))) as boss_extrude6_sk:
        Polygon((-33.5, 25), (-32.063859338, 24), (-33.5, 23), align=None)
        Polygon((33.5, 25), (33.5, 23), (32.063859338, 24), align=None)
    extrude(amount=BOSS_EXTRUDE6_DEPTH)
    extrude(boss_extrude6_sk.sketch, amount=-BOSS_EXTRUDE6_DEPTH_BACK)

    # Sketch19 → Cut-Extrude11 (cut)
    with BuildSketch(Plane(origin=(0, 0, 0), x_dir=(1, 0, 0), z_dir=(0, 1, 0))):
        with Locations((0, 26.5)):
            Rectangle(SKETCH19_W, SKETCH19_H)
    cut_extrude11 = extrude(amount=CUT_EXTRUDE11_DEPTH, mode=Mode.SUBTRACT)

    # LPattern1: Cut-Extrude11 ×2
    with Locations(*[(0, 0, i * LPATTERN1_PITCH) for i in range(1, LPATTERN1_COUNT)]):
        add(cut_extrude11, mode=Mode.SUBTRACT)

    # Mirror1: Cut-Extrude11 across plane
    add(cut_extrude11.mirror(Plane.XY), mode=Mode.SUBTRACT)

    # Mirror1 copy 1 sketch → Mirror1 copy 1 (cut)
    with BuildSketch(Plane(origin=(0, 0, -2.5), x_dir=(1, 0, 0), z_dir=(0, 1, 0))):
        with Locations((0, -26.5)):
            Rectangle(MIRROR1_COPY_1_SKETCH_W, MIRROR1_COPY_1_SKETCH_H)
    extrude(amount=MIRROR1_COPY_1_DEPTH, mode=Mode.SUBTRACT)

    # Chamfer1
    chamfer1_edges = [part.edges().sort_by_distance(p)[0] for p in [
        (30.75, 6.255, 36.235),
        (30.75, 6.065, 37.22),
        (30.75, 4.89, 38.15),
        (30.75, 5.96, 40.15),
        (30.75, 10, 41.22),
        (30.75, 14.04, 40.15),
        (30.75, 15.11, 38.15),
        (30.75, 13.935, 37.22),
        (30.75, 13.745, 36.235),
        (-30.75, 13.745, 36.235),
        (-30.75, 6.255, 36.235),
        (-30.75, 6.065, 37.22),
        (-30.75, 4.89, 38.15),
        (-30.75, 5.96, 40.15),
        (-30.75, 10, 41.22),
        (-30.75, 14.04, 40.15),
        (-30.75, 15.11, 38.15),
        (-30.75, 13.935, 37.22),
    ]]
    chamfer(chamfer1_edges, length=CHAMFER1_SIZE)


solid = part.part
